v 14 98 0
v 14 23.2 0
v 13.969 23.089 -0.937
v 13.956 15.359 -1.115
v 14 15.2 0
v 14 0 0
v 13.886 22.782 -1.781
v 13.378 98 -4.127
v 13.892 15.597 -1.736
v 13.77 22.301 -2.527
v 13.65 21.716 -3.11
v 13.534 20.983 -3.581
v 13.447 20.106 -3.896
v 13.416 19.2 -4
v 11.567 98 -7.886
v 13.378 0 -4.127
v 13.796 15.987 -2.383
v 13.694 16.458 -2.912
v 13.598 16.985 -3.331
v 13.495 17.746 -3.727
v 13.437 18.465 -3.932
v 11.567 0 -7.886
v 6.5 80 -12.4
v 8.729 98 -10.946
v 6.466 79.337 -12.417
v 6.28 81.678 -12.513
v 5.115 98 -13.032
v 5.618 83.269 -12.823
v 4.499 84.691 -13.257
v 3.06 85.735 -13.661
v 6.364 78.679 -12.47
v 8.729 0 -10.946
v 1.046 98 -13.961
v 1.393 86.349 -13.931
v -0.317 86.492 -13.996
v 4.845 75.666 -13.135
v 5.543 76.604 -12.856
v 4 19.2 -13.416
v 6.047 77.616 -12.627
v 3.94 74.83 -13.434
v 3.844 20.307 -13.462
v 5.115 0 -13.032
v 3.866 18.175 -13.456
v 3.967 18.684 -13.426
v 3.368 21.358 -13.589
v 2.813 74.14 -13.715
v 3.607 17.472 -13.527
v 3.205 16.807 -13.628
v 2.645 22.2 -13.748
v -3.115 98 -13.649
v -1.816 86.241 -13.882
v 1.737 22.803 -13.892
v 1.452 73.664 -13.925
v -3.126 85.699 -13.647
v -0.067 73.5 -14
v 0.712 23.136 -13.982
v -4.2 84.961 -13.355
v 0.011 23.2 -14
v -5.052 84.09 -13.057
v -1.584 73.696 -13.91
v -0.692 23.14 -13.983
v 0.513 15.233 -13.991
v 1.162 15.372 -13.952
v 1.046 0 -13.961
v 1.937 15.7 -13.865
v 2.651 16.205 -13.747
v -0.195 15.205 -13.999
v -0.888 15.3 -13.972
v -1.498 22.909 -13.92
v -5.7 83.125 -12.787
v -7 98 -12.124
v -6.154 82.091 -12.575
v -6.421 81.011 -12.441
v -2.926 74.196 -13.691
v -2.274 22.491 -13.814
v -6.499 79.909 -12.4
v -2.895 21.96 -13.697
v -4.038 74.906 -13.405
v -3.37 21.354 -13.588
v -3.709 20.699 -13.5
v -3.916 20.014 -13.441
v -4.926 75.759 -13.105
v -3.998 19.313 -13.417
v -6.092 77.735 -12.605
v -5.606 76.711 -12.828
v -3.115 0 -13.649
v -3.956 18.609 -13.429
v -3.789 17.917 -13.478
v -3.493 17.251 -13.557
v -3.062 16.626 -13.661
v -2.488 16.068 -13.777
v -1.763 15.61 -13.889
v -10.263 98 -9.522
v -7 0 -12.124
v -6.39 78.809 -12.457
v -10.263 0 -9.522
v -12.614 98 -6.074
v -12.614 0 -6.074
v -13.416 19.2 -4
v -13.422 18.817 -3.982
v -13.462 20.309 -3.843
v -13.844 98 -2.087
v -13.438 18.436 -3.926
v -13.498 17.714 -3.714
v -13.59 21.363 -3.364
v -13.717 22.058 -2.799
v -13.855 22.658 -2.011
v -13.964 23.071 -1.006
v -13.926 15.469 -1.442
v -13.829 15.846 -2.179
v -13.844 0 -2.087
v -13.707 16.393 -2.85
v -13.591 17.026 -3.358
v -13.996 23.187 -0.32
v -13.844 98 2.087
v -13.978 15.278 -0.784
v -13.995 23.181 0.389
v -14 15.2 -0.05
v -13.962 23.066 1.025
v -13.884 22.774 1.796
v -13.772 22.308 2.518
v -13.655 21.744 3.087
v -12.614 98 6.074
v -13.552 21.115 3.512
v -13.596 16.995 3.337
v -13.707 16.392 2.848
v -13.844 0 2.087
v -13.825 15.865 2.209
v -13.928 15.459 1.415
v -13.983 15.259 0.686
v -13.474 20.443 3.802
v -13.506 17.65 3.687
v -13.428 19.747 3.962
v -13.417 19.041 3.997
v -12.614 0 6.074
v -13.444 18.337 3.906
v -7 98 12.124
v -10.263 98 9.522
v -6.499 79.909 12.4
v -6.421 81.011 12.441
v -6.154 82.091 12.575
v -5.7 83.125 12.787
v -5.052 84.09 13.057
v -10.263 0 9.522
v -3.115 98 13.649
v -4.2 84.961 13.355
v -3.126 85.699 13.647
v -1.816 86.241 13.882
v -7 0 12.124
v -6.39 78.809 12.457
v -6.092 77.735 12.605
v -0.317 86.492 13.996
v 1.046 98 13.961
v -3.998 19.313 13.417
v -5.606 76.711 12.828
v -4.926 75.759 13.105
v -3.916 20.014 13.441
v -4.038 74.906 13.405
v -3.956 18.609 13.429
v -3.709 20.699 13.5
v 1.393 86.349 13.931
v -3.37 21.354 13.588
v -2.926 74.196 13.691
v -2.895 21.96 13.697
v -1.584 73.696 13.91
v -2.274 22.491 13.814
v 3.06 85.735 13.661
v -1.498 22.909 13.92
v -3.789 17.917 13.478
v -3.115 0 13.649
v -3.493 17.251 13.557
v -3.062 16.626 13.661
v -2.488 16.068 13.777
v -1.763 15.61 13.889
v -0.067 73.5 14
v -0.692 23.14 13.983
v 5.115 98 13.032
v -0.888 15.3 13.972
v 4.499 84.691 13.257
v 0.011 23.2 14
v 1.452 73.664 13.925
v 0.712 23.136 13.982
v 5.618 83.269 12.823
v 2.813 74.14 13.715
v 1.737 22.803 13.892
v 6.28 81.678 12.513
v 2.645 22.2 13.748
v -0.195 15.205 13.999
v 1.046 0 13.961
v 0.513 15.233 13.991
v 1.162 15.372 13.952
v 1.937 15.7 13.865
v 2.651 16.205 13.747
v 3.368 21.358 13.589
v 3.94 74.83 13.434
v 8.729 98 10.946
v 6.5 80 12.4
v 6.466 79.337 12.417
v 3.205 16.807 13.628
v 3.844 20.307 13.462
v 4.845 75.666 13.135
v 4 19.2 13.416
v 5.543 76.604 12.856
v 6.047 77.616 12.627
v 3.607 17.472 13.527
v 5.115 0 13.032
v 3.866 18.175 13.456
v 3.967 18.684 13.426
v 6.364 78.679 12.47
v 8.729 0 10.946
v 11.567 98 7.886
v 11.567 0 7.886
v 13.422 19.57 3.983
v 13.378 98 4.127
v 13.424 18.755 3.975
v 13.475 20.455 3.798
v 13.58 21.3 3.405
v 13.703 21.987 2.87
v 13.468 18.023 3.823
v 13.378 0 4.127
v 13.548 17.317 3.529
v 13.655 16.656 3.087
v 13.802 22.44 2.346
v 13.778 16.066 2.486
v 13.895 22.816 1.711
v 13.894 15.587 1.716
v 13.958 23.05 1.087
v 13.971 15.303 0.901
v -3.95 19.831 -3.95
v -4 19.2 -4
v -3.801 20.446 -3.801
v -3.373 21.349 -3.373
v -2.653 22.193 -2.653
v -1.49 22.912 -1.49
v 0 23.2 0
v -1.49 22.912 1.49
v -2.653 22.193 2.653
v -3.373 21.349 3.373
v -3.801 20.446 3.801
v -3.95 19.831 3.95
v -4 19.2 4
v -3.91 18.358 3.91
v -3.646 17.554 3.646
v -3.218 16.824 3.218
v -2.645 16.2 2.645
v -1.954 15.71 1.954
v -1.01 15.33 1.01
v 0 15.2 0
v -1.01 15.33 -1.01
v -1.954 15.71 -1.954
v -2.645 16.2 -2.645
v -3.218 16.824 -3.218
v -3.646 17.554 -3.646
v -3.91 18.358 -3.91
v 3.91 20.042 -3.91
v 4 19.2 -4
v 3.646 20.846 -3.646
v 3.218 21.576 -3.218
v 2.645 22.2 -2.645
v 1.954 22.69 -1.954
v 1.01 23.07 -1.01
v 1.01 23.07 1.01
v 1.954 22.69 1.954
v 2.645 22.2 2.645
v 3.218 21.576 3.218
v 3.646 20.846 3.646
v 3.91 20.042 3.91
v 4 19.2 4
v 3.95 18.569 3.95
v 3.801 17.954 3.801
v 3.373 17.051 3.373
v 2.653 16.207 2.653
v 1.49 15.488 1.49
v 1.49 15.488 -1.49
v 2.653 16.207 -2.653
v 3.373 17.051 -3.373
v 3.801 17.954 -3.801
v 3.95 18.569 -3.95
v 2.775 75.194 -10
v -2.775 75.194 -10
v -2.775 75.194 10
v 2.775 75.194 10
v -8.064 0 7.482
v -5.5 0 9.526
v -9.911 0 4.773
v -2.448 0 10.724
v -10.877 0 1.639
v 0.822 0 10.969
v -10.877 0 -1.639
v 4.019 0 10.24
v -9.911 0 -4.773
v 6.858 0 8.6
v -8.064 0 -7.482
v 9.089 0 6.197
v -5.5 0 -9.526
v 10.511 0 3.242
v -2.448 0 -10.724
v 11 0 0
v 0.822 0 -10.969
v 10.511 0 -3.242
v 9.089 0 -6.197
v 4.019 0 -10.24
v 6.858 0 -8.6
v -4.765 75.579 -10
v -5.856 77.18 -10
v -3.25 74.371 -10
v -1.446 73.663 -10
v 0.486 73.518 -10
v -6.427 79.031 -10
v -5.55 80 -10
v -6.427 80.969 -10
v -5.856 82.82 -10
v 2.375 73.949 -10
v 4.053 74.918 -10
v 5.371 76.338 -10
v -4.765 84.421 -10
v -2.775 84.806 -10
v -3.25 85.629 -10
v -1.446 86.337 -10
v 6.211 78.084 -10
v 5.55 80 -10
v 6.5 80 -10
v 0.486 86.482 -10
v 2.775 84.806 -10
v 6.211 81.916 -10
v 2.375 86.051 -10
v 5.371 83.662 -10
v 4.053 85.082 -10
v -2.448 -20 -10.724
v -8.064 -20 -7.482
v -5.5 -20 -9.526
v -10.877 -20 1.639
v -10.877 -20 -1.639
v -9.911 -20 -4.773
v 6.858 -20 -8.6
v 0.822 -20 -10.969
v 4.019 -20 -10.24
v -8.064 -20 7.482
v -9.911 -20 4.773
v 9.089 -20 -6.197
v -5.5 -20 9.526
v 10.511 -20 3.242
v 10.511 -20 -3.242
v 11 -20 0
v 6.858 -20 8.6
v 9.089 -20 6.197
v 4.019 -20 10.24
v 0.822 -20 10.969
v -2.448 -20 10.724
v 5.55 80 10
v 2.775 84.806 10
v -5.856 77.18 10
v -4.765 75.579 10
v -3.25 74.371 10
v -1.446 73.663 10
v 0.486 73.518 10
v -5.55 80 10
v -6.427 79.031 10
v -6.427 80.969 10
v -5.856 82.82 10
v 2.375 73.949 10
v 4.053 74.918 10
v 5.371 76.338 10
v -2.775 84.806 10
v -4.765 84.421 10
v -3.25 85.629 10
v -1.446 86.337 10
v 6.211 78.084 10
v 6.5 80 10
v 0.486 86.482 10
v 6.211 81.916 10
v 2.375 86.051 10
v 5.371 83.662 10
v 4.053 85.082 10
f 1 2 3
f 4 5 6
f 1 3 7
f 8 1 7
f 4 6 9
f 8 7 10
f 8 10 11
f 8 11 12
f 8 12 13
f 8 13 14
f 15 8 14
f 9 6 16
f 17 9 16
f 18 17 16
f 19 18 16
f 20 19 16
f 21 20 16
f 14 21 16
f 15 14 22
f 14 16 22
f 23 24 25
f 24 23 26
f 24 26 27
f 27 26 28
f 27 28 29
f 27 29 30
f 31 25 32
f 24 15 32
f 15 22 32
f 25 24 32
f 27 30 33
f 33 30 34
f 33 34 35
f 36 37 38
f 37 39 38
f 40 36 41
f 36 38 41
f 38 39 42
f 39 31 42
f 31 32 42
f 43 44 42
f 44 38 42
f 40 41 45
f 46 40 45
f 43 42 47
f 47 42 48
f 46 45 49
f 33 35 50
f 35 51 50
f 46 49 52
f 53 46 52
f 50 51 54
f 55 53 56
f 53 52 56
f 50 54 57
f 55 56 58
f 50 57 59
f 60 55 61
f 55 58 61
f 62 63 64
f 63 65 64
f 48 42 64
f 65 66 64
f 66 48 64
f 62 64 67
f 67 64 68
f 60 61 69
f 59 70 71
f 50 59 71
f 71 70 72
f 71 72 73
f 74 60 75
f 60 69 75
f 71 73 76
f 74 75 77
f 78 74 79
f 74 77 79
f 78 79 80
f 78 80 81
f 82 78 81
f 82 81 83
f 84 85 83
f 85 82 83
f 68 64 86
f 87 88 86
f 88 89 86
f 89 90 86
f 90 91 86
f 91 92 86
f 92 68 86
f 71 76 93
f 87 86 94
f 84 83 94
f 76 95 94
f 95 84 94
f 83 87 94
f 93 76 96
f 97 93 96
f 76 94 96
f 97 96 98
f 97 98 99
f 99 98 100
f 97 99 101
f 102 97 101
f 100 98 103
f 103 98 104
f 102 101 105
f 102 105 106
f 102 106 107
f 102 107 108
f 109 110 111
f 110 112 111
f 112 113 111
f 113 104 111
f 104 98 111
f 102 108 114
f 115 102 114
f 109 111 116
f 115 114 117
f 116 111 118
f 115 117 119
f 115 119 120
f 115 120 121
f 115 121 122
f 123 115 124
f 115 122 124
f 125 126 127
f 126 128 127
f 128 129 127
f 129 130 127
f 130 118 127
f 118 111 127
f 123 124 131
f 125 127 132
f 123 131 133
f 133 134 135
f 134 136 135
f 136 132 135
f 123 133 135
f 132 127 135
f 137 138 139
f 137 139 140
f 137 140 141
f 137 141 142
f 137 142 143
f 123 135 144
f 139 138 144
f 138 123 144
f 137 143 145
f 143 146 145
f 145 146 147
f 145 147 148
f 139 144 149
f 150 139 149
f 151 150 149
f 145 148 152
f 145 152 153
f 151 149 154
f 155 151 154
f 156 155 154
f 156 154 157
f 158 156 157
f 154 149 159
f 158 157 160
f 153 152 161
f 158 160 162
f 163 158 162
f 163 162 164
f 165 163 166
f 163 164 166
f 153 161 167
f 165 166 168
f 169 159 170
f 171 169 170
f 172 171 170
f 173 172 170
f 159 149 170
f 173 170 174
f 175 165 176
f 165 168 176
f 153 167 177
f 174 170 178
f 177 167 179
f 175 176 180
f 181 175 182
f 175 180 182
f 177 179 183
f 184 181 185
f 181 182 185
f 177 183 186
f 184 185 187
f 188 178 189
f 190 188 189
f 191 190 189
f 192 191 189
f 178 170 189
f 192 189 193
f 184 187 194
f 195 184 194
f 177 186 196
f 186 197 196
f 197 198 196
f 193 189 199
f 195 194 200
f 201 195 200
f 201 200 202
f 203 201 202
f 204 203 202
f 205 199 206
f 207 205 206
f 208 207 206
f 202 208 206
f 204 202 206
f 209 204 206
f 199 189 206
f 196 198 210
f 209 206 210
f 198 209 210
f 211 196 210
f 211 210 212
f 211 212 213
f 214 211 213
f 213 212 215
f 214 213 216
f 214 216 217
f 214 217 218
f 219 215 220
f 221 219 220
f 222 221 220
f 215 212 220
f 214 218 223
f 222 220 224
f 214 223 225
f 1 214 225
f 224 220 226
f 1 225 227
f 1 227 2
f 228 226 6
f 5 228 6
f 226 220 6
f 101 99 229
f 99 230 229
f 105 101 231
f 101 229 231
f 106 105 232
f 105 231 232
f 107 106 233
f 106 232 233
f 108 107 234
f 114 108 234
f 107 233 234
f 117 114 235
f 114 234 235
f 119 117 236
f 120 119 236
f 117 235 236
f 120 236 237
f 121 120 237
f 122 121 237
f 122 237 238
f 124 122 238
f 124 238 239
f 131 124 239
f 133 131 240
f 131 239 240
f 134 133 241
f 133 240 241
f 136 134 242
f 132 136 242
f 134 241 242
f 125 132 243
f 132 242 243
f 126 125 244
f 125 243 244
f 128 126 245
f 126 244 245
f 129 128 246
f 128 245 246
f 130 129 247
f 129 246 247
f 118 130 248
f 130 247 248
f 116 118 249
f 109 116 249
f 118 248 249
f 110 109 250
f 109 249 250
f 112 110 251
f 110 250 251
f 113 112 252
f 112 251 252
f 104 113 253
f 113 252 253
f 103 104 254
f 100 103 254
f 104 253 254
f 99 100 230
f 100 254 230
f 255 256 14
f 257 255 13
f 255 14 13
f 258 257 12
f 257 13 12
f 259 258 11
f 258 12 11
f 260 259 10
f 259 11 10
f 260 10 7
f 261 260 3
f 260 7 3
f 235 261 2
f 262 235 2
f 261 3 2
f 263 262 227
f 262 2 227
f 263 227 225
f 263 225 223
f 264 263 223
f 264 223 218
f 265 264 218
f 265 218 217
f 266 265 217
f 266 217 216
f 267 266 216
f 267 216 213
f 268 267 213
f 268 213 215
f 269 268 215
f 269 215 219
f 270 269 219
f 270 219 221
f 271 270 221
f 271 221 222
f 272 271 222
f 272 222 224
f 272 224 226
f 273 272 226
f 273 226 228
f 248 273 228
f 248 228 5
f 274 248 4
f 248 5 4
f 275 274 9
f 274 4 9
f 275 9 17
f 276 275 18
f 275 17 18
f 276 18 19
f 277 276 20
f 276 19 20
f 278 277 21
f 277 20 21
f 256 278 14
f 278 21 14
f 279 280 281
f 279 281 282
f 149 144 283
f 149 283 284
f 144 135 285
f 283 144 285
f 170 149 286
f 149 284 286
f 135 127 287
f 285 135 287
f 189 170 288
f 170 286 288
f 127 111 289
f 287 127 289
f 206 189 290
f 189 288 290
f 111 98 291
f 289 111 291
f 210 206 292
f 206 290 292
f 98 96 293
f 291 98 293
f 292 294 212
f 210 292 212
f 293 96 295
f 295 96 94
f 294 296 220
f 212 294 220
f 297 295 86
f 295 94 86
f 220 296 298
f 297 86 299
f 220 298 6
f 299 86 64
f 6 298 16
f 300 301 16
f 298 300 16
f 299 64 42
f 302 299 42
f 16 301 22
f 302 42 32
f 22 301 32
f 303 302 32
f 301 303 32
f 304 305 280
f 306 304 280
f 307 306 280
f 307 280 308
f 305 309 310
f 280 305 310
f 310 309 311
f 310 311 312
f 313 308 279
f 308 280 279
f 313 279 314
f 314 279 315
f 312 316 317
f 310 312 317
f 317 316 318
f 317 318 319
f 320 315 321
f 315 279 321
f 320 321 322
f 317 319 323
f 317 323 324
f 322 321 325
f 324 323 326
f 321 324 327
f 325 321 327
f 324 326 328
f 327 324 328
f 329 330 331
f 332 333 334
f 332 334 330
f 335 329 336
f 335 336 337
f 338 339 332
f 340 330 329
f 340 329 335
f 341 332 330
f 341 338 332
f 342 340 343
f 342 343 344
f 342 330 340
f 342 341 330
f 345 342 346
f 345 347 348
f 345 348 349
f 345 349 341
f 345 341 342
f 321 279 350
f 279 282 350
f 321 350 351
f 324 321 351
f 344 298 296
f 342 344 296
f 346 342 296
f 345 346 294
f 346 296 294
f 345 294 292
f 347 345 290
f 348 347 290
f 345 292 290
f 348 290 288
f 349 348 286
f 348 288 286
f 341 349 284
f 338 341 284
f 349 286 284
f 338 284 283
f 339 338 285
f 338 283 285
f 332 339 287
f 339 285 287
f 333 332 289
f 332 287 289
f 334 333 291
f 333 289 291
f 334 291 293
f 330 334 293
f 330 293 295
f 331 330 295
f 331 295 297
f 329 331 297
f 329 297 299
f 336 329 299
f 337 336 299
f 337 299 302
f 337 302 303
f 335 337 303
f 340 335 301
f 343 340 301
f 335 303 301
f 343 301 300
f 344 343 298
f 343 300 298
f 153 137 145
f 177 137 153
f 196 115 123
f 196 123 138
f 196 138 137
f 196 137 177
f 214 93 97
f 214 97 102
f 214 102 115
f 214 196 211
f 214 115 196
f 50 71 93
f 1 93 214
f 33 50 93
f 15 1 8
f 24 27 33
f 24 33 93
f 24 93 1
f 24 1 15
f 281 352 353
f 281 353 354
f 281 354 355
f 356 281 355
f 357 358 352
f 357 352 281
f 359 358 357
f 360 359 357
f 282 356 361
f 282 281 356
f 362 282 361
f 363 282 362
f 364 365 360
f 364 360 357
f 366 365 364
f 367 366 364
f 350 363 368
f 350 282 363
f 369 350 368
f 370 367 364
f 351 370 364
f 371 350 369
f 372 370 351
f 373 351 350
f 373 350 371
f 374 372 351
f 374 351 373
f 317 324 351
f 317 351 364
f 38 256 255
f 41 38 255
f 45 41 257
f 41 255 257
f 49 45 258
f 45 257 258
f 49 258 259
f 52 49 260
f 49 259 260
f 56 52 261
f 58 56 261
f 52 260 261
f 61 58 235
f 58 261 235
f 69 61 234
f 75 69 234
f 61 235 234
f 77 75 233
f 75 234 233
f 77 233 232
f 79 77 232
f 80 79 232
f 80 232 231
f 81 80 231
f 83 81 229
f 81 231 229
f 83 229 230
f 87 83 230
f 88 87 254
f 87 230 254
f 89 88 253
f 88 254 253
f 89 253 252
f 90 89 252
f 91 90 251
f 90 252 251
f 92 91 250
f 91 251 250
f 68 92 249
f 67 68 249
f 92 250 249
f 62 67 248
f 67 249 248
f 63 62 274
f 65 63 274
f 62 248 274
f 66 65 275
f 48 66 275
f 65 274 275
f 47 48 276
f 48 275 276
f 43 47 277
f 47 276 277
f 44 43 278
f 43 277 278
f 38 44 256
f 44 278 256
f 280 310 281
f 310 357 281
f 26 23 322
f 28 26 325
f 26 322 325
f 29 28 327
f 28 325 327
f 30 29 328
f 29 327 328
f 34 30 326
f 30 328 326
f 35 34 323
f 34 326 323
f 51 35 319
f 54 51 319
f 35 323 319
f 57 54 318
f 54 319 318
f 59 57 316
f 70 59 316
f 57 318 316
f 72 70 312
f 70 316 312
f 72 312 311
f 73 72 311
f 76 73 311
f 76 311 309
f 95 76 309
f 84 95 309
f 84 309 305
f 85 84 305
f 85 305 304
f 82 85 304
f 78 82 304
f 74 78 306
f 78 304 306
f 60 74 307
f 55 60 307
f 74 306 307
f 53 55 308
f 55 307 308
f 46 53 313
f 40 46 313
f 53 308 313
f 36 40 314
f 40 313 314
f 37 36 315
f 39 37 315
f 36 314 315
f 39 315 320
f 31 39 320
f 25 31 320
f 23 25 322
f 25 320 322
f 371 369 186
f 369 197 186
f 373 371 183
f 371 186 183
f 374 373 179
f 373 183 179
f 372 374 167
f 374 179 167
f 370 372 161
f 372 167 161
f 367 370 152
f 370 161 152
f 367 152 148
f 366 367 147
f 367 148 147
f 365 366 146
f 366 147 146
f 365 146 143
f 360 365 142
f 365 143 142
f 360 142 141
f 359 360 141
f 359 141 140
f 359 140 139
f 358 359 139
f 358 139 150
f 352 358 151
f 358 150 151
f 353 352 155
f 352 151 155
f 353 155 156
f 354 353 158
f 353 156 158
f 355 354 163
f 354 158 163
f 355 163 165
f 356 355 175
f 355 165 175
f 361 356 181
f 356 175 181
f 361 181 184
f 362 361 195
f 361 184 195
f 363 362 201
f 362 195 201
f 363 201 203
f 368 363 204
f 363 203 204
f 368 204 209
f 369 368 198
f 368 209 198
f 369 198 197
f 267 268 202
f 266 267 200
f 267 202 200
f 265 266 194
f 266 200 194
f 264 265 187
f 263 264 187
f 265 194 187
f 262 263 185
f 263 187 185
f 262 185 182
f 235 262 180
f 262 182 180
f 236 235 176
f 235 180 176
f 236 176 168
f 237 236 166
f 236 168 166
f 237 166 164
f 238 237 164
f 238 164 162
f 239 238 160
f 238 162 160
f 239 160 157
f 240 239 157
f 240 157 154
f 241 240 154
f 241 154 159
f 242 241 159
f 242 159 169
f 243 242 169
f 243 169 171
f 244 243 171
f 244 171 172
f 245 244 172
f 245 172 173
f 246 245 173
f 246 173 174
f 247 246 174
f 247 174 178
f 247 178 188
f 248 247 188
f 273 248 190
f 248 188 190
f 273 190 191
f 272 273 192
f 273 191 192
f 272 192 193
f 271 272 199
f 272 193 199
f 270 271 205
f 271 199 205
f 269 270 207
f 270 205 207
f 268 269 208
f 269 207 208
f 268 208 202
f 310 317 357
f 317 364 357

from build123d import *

# Parameters (mm, degrees)
SKETCH_1_R          = 14
EXTRUDE_1_DEPTH     = 98
SKETCH_2_R          = 6.5
SKETCH_2_R_2        = 4
CUT_EXTRUDE_1_DEPTH = 113.5
SKETCH_3_R          = 7.5
EXTRUDE_2_DEPTH     = 10
SKETCH_4_R          = 11
EXTRUDE_4_DEPTH     = 20
SKETCH_5_R          = 4
CUT_EXTRUDE_2_DEPTH = 20


with BuildPart() as part:
    # 草图1 → 凸台-拉伸1 (new body)
    with BuildSketch(Plane(origin=(0, 0, 0), x_dir=(1, 0, 0), z_dir=(0, 1, 0))):
        Circle(SKETCH_1_R)
    extrude(amount=EXTRUDE_1_DEPTH)

    # 草图2 → 切除-拉伸1 (cut, symmetric)
    with BuildSketch(Plane.XY):
        with Locations((0, 80)):
            Circle(SKETCH_2_R)
        with Locations((0, 19.2)):
            Circle(SKETCH_2_R_2)
    extrude(amount=CUT_EXTRUDE_1_DEPTH, both=True, mode=Mode.SUBTRACT)

    # 草图3 → 凸台-拉伸2 (add, symmetric)
    with BuildSketch(Plane.XY):
        with Locations((0, 80)):
            Circle(SKETCH_3_R)
        Polygon((5.55, 80), (2.775, 84.806440991), (-2.775, 84.806440991), (-5.55, 80), (-2.775, 75.193559009), (2.775, 75.193559009), align=None, mode=Mode.SUBTRACT)
    extrude(amount=EXTRUDE_2_DEPTH, both=True)

    # 草图4 → 凸台-拉伸4 (add)
    with BuildSketch(Plane.XZ):
        Circle(SKETCH_4_R)
    extrude(amount=EXTRUDE_4_DEPTH)

    # 草图5 → 切除-拉伸2 (cut, symmetric)
    with BuildSketch(Plane(origin=(0, 0, 0), x_dir=(0, 0, -1), z_dir=(1, 0, 0))):
        with Locations((0, 19.2)):
            Circle(SKETCH_5_R)
    extrude(amount=CUT_EXTRUDE_2_DEPTH, both=True, mode=Mode.SUBTRACT)


solid = part.part
